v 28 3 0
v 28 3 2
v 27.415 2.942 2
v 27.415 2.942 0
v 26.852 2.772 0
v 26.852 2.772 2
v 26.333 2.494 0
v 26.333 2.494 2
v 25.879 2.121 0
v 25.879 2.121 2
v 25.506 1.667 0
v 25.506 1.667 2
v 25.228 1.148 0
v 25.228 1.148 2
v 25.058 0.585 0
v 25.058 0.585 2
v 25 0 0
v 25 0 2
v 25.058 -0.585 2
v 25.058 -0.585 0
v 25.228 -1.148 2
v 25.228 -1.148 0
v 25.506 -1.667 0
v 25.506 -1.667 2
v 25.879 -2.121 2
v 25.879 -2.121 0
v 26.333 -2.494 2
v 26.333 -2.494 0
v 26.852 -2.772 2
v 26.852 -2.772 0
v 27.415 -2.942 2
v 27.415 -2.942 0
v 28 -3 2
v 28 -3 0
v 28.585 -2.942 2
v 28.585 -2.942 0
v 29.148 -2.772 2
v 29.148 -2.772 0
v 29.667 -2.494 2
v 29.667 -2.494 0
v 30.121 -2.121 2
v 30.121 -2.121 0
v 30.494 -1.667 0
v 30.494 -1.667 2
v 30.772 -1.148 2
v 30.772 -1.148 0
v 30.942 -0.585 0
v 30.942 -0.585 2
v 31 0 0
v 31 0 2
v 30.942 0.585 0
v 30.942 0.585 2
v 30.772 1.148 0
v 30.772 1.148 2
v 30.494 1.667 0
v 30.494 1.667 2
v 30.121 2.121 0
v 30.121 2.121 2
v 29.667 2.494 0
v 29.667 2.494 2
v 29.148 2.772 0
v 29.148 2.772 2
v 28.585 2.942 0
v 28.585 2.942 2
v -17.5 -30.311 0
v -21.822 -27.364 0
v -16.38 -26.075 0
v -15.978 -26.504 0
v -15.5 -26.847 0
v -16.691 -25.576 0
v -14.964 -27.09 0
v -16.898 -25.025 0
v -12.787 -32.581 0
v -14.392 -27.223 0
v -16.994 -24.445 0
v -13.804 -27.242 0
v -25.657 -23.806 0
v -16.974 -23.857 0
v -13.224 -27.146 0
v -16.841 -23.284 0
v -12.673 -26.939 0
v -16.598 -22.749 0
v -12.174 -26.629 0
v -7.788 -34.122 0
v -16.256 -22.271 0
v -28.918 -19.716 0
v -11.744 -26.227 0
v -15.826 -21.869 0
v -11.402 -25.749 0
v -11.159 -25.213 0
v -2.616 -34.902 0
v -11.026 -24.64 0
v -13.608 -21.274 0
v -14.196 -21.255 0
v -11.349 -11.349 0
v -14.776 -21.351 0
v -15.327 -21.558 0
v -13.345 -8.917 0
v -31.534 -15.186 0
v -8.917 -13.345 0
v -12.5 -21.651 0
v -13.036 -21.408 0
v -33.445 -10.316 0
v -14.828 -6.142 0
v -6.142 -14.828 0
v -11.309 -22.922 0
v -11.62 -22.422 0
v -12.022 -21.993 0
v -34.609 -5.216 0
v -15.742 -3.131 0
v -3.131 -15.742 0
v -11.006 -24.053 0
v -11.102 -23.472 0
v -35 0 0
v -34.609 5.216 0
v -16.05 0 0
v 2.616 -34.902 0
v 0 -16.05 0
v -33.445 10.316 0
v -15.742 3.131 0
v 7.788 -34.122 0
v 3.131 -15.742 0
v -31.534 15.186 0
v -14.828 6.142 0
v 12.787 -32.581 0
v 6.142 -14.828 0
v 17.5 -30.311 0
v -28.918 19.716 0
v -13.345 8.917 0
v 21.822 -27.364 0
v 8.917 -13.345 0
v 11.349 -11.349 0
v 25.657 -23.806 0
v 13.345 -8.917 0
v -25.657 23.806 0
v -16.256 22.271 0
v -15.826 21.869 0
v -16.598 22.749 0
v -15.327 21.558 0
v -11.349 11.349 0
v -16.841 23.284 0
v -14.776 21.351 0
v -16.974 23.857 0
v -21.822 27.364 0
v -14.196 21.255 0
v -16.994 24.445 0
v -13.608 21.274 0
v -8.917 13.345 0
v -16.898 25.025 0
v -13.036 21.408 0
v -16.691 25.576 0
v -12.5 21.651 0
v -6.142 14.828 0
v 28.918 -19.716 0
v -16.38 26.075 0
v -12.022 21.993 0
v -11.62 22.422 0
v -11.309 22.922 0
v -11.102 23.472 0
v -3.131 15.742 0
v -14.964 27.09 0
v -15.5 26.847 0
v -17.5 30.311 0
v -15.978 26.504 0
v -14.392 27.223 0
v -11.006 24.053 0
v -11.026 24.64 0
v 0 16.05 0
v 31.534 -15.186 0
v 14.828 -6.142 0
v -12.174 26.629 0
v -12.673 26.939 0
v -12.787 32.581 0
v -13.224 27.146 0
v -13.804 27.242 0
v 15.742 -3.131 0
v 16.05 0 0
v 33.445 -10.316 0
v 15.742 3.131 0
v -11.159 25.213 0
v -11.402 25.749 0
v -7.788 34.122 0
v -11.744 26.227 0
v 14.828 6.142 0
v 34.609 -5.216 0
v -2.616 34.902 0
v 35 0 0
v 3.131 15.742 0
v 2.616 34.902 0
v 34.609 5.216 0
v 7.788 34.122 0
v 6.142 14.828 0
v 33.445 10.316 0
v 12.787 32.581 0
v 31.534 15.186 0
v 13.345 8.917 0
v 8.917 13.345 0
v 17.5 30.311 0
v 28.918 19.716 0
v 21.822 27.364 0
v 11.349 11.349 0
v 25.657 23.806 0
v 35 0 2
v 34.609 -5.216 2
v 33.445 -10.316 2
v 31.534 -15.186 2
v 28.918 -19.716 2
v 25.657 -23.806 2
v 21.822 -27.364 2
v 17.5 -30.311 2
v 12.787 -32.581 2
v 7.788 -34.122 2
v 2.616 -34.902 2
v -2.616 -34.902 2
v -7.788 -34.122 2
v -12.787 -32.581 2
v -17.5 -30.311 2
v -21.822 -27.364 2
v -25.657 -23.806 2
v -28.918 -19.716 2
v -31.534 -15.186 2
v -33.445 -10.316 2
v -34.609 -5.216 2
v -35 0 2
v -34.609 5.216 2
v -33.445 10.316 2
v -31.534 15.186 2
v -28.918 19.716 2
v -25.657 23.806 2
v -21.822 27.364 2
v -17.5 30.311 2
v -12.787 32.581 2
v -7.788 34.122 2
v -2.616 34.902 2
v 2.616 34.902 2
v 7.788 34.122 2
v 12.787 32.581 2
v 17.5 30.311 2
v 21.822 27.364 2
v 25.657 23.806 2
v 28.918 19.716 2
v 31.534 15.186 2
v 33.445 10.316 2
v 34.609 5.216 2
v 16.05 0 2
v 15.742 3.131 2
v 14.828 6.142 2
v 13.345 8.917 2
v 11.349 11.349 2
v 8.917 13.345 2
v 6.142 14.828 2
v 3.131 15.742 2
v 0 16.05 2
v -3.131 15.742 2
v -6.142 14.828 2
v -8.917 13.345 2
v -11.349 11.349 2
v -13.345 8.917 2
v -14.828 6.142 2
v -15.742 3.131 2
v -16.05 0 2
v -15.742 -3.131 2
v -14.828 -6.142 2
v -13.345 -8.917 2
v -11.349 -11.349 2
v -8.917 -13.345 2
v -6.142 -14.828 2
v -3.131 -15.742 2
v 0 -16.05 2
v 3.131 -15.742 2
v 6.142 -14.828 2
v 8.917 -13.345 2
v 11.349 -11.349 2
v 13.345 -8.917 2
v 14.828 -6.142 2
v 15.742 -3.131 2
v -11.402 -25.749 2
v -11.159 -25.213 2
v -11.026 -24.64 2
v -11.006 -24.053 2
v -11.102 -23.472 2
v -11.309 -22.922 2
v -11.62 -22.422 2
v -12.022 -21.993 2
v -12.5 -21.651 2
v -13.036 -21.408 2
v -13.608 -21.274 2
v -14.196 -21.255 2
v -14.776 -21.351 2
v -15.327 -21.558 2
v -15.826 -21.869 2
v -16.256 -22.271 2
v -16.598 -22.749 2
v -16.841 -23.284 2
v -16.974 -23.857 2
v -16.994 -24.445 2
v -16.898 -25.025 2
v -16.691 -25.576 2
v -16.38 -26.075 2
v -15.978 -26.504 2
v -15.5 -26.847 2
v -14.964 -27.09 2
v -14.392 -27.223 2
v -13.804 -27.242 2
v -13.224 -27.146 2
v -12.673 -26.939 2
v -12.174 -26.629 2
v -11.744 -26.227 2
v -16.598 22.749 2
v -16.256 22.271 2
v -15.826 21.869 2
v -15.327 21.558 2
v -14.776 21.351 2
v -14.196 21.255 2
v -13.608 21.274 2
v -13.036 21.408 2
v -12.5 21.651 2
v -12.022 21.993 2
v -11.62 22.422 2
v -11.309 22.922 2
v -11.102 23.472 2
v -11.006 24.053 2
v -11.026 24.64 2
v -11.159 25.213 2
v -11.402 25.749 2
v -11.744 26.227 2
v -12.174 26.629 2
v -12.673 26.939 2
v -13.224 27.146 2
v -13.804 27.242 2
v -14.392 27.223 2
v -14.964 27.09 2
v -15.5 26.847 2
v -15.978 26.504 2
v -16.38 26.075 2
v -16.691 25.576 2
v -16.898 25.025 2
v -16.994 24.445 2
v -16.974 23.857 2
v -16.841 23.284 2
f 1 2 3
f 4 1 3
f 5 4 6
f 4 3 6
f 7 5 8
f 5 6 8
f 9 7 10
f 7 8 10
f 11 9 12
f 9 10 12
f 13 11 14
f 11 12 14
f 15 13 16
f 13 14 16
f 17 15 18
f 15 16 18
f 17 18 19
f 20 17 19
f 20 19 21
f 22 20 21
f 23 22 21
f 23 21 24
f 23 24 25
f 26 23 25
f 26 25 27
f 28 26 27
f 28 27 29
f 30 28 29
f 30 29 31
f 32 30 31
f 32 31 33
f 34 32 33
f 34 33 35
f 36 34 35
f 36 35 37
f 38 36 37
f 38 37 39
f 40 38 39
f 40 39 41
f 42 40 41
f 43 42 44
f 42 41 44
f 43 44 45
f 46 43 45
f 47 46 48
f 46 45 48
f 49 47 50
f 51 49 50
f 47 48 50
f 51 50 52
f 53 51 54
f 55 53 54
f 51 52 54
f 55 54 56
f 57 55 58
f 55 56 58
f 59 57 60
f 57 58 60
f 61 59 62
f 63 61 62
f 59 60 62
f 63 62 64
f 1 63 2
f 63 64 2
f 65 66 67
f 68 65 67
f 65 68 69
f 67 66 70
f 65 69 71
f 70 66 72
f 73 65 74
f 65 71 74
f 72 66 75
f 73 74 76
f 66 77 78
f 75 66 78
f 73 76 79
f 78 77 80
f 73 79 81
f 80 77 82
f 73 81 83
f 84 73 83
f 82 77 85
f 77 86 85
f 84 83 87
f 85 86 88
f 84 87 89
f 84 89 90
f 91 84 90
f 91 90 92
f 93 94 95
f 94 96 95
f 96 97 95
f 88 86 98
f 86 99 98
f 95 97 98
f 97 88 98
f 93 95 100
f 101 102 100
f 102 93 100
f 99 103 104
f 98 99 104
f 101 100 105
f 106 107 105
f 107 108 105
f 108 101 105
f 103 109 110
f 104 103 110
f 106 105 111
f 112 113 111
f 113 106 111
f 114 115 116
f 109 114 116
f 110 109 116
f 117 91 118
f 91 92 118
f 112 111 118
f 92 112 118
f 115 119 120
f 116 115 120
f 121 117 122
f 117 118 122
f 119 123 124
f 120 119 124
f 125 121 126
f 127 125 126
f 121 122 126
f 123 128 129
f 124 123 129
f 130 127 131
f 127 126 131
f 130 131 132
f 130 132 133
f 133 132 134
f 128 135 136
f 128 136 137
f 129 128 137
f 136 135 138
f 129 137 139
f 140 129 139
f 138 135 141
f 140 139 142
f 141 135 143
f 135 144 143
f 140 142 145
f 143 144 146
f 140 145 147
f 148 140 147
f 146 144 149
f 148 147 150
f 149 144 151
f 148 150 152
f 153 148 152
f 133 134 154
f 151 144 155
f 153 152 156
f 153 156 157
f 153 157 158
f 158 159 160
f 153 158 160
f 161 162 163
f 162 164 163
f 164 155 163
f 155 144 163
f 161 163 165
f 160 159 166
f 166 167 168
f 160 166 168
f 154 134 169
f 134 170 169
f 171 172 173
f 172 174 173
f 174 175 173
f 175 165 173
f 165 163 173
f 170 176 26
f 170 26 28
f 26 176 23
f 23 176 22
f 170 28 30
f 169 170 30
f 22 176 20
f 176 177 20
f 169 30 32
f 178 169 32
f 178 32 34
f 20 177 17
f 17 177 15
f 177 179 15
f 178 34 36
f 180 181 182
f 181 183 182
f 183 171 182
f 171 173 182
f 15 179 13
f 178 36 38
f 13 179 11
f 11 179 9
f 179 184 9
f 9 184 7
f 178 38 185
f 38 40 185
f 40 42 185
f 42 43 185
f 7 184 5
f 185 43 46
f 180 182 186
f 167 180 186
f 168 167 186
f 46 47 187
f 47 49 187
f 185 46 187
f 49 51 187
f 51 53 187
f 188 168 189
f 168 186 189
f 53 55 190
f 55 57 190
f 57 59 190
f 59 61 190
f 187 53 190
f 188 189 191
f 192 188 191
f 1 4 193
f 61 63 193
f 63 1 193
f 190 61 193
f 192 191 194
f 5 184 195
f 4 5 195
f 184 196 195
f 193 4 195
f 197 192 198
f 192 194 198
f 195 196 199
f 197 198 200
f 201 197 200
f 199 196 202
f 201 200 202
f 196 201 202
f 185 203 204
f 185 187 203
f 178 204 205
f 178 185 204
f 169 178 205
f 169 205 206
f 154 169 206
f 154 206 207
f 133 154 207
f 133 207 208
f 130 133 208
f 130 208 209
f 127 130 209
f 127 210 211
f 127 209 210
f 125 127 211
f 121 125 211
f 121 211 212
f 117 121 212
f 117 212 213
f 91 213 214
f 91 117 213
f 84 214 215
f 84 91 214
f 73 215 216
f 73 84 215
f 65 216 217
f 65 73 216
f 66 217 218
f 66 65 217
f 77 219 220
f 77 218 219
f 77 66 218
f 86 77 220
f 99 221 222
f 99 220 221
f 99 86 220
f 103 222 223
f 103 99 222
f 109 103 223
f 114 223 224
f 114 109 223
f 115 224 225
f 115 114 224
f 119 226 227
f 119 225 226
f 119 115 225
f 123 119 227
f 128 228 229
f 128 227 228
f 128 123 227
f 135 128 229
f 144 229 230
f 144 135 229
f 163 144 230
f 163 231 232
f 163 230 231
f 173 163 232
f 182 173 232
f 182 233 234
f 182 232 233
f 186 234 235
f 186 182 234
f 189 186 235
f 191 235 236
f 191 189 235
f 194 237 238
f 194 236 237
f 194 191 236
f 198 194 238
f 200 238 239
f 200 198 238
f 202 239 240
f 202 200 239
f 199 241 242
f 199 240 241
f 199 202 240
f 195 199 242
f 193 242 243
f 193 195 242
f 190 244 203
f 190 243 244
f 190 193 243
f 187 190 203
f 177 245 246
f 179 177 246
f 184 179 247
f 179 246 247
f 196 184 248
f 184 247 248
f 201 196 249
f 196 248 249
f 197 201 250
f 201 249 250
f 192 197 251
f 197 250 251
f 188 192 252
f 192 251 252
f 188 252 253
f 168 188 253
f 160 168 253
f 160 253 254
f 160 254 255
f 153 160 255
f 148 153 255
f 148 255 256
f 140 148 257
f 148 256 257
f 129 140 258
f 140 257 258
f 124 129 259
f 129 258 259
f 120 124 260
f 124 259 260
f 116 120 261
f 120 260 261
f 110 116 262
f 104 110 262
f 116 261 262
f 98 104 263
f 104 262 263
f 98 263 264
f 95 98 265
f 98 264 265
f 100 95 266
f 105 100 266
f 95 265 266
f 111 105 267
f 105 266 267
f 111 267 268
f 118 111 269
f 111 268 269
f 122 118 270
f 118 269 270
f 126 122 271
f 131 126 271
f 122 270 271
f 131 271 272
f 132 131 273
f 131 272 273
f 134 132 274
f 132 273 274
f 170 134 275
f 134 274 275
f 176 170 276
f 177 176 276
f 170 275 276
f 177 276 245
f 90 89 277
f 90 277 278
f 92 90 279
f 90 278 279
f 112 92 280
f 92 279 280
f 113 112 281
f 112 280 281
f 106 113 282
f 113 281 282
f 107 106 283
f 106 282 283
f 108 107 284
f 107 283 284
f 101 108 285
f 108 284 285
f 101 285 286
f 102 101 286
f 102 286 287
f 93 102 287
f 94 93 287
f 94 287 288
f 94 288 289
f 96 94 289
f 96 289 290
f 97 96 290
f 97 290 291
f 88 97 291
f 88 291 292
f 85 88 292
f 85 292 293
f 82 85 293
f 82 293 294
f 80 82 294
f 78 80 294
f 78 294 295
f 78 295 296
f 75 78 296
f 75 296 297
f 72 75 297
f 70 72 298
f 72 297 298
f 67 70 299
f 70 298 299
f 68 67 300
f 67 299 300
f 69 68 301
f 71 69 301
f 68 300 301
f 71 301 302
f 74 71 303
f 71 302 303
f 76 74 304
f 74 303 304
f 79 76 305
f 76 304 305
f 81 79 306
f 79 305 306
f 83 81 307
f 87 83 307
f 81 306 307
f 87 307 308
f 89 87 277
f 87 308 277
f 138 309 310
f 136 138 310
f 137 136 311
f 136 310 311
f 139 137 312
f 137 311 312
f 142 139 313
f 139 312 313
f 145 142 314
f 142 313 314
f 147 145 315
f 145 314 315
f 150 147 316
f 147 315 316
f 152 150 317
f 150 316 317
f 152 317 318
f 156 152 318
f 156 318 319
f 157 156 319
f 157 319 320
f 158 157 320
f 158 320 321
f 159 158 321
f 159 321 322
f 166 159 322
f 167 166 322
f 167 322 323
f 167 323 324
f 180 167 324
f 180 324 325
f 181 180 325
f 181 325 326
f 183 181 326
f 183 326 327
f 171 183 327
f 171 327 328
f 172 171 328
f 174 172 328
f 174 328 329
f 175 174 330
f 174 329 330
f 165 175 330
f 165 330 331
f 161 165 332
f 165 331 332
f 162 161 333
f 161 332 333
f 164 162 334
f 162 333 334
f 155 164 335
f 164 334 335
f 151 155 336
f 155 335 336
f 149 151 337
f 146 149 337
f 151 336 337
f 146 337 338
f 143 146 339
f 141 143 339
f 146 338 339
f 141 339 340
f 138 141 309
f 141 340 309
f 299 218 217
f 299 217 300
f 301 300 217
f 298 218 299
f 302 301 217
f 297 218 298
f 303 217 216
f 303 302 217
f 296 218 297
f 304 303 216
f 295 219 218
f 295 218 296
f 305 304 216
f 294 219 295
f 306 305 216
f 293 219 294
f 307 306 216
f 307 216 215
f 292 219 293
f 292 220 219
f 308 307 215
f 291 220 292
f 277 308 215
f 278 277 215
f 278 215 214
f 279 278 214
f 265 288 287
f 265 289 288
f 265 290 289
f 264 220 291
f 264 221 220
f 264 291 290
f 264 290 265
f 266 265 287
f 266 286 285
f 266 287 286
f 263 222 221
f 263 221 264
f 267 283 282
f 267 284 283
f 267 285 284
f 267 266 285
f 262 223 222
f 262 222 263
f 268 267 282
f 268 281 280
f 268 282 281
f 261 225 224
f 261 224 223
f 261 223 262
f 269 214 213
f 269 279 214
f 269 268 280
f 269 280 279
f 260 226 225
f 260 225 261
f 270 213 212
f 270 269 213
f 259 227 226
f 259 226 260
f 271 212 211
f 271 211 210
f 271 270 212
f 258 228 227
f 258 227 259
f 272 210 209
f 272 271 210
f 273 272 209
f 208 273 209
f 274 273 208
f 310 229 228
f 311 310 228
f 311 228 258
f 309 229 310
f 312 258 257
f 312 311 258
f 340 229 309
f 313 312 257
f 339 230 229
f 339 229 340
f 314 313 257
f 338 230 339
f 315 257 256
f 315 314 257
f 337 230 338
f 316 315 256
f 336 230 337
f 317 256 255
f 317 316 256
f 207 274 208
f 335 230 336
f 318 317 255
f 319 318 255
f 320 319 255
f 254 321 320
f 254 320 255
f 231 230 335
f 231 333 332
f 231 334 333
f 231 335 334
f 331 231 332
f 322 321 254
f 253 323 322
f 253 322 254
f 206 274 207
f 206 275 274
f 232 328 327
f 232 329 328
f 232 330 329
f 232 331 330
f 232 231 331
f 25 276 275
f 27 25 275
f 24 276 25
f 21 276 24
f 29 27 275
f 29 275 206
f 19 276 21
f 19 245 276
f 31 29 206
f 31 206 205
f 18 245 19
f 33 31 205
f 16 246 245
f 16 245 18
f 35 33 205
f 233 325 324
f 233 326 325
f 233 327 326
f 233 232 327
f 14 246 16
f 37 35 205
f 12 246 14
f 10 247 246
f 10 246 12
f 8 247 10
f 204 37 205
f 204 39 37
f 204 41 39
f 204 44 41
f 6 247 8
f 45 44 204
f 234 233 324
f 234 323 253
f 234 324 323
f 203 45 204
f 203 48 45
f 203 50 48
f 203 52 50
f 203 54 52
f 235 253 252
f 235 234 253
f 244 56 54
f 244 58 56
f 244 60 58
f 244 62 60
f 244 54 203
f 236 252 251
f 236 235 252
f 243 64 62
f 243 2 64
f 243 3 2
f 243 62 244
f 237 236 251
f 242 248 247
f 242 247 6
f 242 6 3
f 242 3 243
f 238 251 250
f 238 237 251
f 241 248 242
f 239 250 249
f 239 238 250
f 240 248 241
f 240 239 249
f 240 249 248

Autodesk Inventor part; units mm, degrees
ref_plane "YZ Plane" through (0, 0, 0) normal (1, 0, 0) x (0, 1, 0)
ref_plane "XZ Plane" through (0, 0, 0) normal (0, 1, 0) x (-1, 0, 0)
ref_plane "XY Plane" through (0, 0, 0) normal (0, 0, 1) x (1, 0, 0)
sketch "Sketch1" plane through (0, 0, 0) normal (0, 0, 1) x (1, 0, 0)
  circle A0 centre (0, 0) radius 35
  dimension "d0" = 70
extrude "Plate1" add sketch "Sketch1" along normal blind 2
sketch "Sketch2" plane through (0, 0, 0) normal (0, 0, 1) x (1, 0, 0)
  point P0 (0, 0)
  point P1 (28, 0)
  dimension "d2" = 28
hole "Hole1" at (28, 0, 0) direction (0, 0, 1) diameter 6 end through all
pattern_circular "Circular Pattern1" count 3 over 360 about axis through (0, 0, -10) along (0, 0, 1) of "Hole1"
sketch "Sketch3" plane through (0, 0, 2) normal (0, 0, 1) x (1, 0, 0)
  circle A0 centre (0, 0) radius 16.05
  dimension "d13" = 32.1
extrude "Extrusion1" cut sketch "Sketch3" against normal through all
equation "\"d0\" = Внешний_диам_фланца"
equation "\"d8\" = Thickness"
equation "\"d1\" = Thickness"
equation "\"BendRadius\" = Thickness"
equation "\"BendReliefWidth\" = Thickness"
equation "\"BendReliefDepth\" = 0.5 * Thickness"
equation "\"CornerReliefSize\" = 4 * Thickness"
equation "\"MinimumRemnant\" = 2 * Thickness"
equation "\"TransitionRadius\" = BendRadius"
equation "\"JacobiRadiusSize\" = BendRadius"
equation "\"GapSize\" = Thickness"
equation "\"Внешний_диам_фланца\" = 70"
equation "\"Thickness\" = 2"
properties part number "платик крепежный"
